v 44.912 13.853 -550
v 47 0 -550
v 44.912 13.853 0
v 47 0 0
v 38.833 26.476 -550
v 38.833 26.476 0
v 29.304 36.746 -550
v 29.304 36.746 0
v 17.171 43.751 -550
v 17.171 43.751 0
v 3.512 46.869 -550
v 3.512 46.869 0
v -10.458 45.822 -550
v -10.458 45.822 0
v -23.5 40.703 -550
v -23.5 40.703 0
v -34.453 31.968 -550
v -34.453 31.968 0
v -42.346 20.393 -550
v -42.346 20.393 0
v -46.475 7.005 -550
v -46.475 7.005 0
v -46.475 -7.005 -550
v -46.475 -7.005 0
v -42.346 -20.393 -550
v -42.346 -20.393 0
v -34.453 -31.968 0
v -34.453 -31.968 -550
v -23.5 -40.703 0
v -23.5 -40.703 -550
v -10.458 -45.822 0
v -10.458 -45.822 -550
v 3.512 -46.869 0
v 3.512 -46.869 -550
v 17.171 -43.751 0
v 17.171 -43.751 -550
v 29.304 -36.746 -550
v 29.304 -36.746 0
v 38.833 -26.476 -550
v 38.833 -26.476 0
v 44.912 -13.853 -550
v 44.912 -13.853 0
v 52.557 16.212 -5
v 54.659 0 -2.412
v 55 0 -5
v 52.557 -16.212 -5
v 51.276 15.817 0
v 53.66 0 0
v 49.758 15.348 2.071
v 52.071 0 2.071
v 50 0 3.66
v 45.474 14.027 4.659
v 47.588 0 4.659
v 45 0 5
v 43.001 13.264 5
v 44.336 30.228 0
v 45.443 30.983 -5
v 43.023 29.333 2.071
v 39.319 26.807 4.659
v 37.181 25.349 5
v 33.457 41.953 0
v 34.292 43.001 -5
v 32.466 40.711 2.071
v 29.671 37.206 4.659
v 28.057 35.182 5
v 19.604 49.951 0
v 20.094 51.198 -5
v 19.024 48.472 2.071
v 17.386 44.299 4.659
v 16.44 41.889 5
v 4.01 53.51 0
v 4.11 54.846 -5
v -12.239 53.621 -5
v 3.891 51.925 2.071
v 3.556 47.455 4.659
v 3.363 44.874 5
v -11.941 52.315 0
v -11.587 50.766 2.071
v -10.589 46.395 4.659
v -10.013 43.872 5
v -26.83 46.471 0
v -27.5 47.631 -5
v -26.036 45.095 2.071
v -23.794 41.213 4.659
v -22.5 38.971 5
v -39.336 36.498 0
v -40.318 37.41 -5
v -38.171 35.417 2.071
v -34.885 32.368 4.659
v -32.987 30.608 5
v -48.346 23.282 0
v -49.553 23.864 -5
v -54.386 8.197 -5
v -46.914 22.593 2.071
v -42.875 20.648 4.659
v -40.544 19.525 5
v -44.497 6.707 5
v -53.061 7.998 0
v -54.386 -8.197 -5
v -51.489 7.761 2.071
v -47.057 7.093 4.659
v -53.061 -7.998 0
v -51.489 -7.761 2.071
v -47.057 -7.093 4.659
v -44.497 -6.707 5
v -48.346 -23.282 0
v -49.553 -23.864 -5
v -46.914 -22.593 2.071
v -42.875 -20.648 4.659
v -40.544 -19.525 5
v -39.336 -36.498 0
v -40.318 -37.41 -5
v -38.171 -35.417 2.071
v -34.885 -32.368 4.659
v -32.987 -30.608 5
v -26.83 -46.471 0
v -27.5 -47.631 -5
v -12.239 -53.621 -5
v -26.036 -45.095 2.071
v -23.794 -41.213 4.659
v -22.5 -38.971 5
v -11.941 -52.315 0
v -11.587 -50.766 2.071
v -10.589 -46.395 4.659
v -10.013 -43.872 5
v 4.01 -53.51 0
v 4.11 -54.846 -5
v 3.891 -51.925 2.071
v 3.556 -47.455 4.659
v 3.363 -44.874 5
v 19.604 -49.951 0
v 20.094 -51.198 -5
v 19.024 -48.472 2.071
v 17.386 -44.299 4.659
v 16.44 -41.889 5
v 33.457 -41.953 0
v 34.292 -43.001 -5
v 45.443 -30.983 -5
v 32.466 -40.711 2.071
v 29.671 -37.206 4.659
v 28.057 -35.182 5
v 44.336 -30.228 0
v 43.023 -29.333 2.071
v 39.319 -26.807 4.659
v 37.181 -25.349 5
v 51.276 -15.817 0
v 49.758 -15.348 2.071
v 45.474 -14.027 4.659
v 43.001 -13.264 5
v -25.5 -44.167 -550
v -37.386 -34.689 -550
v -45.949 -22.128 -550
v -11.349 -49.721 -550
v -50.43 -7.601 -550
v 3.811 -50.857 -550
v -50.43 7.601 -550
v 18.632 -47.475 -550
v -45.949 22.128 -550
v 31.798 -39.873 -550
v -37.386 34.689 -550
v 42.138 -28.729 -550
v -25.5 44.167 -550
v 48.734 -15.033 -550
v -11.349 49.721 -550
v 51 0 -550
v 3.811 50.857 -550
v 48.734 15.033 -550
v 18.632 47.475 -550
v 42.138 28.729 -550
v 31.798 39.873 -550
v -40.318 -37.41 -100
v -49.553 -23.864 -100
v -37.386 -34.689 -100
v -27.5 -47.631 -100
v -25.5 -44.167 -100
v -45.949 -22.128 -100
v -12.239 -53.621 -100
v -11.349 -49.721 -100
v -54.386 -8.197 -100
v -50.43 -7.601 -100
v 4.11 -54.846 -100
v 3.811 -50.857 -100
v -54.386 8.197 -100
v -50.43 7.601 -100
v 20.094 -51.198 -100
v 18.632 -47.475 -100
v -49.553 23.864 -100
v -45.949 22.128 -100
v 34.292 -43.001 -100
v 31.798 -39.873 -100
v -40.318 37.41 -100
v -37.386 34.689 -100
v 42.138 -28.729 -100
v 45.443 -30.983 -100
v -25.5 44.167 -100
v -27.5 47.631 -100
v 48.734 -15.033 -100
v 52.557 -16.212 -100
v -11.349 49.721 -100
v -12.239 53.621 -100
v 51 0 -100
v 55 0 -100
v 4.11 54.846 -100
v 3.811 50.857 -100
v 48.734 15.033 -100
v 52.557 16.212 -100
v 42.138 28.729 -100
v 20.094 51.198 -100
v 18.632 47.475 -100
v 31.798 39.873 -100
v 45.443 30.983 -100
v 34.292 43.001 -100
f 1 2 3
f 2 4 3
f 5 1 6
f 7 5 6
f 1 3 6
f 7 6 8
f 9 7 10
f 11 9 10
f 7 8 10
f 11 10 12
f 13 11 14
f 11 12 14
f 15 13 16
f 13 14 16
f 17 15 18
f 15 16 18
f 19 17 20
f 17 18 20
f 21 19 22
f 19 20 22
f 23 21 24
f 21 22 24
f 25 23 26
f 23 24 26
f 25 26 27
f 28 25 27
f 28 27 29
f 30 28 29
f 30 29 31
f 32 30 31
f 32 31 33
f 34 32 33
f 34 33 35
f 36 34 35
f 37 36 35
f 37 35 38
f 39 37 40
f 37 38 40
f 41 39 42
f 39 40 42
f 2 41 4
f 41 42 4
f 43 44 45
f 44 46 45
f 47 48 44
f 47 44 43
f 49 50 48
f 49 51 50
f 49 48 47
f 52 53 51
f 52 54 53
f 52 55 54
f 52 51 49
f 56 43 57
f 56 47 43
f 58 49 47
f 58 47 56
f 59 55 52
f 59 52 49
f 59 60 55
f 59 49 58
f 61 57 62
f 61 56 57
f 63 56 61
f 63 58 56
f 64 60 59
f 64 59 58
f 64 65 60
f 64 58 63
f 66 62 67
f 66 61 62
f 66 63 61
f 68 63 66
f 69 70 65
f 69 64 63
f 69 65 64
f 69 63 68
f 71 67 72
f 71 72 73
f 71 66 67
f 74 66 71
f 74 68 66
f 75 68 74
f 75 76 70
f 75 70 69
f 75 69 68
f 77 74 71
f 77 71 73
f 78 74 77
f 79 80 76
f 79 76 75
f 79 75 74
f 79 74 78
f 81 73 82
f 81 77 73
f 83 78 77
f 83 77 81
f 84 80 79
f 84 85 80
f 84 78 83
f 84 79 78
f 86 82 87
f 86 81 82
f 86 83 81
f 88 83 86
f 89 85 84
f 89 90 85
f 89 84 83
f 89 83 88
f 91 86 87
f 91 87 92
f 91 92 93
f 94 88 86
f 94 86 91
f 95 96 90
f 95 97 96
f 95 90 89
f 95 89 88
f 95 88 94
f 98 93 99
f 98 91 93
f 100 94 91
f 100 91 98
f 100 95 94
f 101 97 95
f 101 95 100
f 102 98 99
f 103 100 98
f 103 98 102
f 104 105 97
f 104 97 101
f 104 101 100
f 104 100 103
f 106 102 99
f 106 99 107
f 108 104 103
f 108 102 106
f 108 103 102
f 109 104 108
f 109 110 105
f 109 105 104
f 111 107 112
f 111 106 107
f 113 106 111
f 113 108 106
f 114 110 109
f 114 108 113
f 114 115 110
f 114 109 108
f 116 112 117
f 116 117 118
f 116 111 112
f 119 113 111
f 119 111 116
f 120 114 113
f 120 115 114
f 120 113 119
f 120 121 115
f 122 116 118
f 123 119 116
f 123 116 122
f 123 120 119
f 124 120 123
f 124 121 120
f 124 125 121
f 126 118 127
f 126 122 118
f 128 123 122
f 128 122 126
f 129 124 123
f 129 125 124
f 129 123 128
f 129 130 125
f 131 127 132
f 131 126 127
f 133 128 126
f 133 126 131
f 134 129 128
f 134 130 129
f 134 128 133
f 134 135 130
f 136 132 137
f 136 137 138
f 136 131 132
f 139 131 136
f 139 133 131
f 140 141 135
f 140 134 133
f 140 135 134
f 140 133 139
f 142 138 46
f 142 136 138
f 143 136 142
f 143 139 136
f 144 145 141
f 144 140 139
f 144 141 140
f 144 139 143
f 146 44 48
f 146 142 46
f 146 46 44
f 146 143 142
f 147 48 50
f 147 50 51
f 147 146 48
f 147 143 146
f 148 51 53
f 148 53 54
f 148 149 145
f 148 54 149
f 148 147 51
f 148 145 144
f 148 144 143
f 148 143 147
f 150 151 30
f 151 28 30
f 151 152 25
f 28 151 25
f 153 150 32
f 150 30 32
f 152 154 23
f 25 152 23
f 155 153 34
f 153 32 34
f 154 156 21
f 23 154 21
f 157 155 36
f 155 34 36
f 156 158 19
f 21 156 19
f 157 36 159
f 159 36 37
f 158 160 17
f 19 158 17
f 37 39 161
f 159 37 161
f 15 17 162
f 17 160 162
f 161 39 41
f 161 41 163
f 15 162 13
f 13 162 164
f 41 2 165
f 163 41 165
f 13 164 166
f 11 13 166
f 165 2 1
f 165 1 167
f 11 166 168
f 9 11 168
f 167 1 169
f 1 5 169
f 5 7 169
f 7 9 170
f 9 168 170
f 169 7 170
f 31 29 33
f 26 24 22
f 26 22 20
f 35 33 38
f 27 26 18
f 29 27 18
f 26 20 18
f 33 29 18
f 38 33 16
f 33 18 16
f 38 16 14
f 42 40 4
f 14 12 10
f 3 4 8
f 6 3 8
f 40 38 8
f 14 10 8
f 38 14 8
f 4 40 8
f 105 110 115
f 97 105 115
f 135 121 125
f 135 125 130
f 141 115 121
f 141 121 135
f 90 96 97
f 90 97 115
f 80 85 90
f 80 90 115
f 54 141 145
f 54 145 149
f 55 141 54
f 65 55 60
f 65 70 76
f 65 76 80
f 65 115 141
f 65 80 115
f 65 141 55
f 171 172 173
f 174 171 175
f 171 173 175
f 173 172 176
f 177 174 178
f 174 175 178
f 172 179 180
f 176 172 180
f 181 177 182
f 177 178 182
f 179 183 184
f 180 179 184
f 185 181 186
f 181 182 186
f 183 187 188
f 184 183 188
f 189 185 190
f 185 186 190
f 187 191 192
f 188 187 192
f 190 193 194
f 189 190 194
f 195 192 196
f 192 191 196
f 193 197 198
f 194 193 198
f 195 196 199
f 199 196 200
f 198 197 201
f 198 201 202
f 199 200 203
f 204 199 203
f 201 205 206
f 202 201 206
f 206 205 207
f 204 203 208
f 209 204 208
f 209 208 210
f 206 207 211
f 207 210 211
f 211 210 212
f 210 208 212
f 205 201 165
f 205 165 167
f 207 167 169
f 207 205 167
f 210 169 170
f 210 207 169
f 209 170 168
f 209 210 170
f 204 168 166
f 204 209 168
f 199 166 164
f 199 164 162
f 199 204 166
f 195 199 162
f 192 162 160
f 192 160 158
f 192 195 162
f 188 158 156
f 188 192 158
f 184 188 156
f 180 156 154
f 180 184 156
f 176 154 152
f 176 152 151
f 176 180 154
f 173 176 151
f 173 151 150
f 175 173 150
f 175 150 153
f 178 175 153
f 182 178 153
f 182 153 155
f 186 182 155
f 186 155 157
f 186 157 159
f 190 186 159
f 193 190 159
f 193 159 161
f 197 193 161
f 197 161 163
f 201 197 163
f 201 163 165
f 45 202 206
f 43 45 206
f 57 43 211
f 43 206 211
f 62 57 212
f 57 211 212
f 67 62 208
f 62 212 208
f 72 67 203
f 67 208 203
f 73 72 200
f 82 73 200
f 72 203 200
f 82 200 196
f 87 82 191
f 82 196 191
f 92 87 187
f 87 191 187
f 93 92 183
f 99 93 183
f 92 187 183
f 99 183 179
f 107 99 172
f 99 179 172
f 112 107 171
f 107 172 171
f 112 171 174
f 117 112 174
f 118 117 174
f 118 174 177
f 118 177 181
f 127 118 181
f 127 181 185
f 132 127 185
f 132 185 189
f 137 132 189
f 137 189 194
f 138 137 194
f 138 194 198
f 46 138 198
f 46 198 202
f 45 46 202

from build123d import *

# Parameters (mm, degrees)
F0_R     = 55
F0_R_2   = 51
F0_R_3   = 47
F1_DEPTH = 5
F2_DEPTH = 50
F3_DEPTH = 100
F4_R     = 10
F5_DEPTH = 500
F6_DEPTH = 50


with BuildPart() as f1:
    # F0 (on Top) → F1 (new body)
    with BuildSketch(Plane.XY):
        Circle(F0_R)
        Circle(F0_R_2, mode=Mode.SUBTRACT)
        Circle(F0_R_2)
        Circle(F0_R_3, mode=Mode.SUBTRACT)
        Circle(F0_R_3)
    extrude(amount=F1_DEPTH)

    # F0 (on Top) → F2 (join)
    with BuildSketch(Plane.XY):
        Circle(F0_R_2)
        Circle(F0_R_3, mode=Mode.SUBTRACT)
    extrude(amount=-F2_DEPTH)

    # F0 (on Top) → F3 (join)
    with BuildSketch(Plane.XY):
        Circle(F0_R)
        Circle(F0_R_2, mode=Mode.SUBTRACT)
    extrude(amount=-F3_DEPTH)

    # F4
    f4_edges = [f1.edges().sort_by_distance(p)[0] for p in [
        (-55, 0, 5),
    ]]
    fillet(f4_edges, radius=F4_R)

    # F5 (add): a face of the model
    f5_faces = [f1.faces().sort_by_distance(p)[0] for p in [
        (-49.5575021664, 0, -50),
    ]]
    extrude(f5_faces, amount=F5_DEPTH)

    # F6 (add): a face of the model
    f6_faces = [f1.faces().sort_by_distance(p)[0] for p in [
        (-53.4443650814, 0, -100),
    ]]
    extrude(f6_faces, amount=-F6_DEPTH)


solid = f1.part
